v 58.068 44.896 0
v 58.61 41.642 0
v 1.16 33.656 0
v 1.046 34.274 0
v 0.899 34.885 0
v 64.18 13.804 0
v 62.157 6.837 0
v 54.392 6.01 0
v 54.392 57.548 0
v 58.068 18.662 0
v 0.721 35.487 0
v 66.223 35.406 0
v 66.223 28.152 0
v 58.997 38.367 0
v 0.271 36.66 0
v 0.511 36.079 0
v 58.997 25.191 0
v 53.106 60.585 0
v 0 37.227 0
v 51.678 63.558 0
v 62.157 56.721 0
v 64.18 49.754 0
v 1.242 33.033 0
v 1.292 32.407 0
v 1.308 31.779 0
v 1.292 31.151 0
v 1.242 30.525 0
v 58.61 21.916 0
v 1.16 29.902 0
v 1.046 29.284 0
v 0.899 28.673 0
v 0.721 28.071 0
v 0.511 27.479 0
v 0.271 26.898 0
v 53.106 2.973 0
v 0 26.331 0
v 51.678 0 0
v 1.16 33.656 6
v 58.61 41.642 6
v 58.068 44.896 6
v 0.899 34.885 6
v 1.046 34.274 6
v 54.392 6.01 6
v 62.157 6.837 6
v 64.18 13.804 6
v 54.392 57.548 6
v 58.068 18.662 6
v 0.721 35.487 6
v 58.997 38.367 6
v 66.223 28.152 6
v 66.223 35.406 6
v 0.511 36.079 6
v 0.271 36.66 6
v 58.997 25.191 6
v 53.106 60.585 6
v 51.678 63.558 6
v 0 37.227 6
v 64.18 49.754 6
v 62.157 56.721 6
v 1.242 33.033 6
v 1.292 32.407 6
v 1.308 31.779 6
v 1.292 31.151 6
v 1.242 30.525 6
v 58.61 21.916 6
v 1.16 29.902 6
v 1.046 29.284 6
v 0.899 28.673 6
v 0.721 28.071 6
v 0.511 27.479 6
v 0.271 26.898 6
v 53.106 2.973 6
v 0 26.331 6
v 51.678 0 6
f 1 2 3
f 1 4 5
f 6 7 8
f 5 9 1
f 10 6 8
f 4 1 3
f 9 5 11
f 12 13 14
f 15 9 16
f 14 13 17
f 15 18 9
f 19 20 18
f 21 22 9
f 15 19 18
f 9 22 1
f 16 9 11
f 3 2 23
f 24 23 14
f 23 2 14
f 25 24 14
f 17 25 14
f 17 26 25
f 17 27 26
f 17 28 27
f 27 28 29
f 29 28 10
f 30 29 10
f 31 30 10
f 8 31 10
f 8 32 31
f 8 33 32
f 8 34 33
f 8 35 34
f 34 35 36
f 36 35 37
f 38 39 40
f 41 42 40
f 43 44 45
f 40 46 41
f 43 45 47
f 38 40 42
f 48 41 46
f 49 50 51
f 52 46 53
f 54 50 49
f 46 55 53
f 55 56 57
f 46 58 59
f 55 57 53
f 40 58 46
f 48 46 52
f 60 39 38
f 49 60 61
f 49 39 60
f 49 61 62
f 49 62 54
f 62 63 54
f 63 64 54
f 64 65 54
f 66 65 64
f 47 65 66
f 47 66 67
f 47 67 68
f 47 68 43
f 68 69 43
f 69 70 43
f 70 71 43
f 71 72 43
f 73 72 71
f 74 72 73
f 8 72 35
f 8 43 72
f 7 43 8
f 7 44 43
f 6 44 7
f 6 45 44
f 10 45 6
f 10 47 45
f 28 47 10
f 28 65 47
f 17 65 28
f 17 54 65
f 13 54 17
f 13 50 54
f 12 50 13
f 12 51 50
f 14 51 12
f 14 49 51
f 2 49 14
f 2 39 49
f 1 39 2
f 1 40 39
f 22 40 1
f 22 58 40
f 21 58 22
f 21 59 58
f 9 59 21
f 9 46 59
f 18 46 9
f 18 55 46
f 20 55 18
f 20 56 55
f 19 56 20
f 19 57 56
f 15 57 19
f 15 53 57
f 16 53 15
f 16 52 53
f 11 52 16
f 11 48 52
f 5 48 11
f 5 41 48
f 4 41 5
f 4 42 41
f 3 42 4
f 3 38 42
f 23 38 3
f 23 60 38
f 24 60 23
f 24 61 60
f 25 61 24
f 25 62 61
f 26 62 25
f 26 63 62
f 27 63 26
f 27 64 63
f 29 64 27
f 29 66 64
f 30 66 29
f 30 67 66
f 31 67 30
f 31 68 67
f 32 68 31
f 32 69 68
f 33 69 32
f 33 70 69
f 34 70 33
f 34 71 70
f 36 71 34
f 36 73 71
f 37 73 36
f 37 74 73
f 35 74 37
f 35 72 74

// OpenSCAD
$fn = 32;

// ----------------------------------------------------------------------
// Gear sector: 3 teeth on 54 degrees
// ----------------------------------------------------------------------

// --- parameters (mm) ---
sector_angle = 54;        // sector angle, degrees
root_r = 70;              // root circle radius
tooth_h = 7;              // tooth height over the root circle
teeth = 3;                // number of teeth on the sector
hub_r = 12;               // hub bore radius
plate_t = 6;              // sector thickness, Z
arc_step = 3;             // sampling step of the root/hub arcs, degrees
fit_tol = 0.05;           // declared fit tolerance (prompt contract)
free_tol = 0.2;           // declared free tolerance (prompt contract)

tip_r = root_r + tooth_h;  // tip circle radius

profile = [[51.678, 0], [53.106, 2.973], [54.392, 6.01], [62.157, 6.837], [64.18, 13.804], [58.068, 18.662], [58.61, 21.916], [58.997, 25.191], [66.223, 28.152], [66.223, 35.406], [58.997, 38.367], [58.61, 41.642], [58.068, 44.896], [64.18, 49.754], [62.157, 56.721], [54.392, 57.548], [53.106, 60.585], [51.678, 63.558], [0, 37.227], [0.271, 36.66], [0.511, 36.079], [0.721, 35.487], [0.899, 34.885], [1.046, 34.274], [1.16, 33.656], [1.242, 33.033], [1.292, 32.407], [1.308, 31.779], [1.292, 31.151], [1.242, 30.525], [1.16, 29.902], [1.046, 29.284], [0.899, 28.673], [0.721, 28.071], [0.511, 27.479], [0.271, 26.898], [0, 26.331]];  // primary outline, 37 points, counter clockwise

// --- the one profile operation ---
linear_extrude(height = plate_t) polygon(points = profile);
